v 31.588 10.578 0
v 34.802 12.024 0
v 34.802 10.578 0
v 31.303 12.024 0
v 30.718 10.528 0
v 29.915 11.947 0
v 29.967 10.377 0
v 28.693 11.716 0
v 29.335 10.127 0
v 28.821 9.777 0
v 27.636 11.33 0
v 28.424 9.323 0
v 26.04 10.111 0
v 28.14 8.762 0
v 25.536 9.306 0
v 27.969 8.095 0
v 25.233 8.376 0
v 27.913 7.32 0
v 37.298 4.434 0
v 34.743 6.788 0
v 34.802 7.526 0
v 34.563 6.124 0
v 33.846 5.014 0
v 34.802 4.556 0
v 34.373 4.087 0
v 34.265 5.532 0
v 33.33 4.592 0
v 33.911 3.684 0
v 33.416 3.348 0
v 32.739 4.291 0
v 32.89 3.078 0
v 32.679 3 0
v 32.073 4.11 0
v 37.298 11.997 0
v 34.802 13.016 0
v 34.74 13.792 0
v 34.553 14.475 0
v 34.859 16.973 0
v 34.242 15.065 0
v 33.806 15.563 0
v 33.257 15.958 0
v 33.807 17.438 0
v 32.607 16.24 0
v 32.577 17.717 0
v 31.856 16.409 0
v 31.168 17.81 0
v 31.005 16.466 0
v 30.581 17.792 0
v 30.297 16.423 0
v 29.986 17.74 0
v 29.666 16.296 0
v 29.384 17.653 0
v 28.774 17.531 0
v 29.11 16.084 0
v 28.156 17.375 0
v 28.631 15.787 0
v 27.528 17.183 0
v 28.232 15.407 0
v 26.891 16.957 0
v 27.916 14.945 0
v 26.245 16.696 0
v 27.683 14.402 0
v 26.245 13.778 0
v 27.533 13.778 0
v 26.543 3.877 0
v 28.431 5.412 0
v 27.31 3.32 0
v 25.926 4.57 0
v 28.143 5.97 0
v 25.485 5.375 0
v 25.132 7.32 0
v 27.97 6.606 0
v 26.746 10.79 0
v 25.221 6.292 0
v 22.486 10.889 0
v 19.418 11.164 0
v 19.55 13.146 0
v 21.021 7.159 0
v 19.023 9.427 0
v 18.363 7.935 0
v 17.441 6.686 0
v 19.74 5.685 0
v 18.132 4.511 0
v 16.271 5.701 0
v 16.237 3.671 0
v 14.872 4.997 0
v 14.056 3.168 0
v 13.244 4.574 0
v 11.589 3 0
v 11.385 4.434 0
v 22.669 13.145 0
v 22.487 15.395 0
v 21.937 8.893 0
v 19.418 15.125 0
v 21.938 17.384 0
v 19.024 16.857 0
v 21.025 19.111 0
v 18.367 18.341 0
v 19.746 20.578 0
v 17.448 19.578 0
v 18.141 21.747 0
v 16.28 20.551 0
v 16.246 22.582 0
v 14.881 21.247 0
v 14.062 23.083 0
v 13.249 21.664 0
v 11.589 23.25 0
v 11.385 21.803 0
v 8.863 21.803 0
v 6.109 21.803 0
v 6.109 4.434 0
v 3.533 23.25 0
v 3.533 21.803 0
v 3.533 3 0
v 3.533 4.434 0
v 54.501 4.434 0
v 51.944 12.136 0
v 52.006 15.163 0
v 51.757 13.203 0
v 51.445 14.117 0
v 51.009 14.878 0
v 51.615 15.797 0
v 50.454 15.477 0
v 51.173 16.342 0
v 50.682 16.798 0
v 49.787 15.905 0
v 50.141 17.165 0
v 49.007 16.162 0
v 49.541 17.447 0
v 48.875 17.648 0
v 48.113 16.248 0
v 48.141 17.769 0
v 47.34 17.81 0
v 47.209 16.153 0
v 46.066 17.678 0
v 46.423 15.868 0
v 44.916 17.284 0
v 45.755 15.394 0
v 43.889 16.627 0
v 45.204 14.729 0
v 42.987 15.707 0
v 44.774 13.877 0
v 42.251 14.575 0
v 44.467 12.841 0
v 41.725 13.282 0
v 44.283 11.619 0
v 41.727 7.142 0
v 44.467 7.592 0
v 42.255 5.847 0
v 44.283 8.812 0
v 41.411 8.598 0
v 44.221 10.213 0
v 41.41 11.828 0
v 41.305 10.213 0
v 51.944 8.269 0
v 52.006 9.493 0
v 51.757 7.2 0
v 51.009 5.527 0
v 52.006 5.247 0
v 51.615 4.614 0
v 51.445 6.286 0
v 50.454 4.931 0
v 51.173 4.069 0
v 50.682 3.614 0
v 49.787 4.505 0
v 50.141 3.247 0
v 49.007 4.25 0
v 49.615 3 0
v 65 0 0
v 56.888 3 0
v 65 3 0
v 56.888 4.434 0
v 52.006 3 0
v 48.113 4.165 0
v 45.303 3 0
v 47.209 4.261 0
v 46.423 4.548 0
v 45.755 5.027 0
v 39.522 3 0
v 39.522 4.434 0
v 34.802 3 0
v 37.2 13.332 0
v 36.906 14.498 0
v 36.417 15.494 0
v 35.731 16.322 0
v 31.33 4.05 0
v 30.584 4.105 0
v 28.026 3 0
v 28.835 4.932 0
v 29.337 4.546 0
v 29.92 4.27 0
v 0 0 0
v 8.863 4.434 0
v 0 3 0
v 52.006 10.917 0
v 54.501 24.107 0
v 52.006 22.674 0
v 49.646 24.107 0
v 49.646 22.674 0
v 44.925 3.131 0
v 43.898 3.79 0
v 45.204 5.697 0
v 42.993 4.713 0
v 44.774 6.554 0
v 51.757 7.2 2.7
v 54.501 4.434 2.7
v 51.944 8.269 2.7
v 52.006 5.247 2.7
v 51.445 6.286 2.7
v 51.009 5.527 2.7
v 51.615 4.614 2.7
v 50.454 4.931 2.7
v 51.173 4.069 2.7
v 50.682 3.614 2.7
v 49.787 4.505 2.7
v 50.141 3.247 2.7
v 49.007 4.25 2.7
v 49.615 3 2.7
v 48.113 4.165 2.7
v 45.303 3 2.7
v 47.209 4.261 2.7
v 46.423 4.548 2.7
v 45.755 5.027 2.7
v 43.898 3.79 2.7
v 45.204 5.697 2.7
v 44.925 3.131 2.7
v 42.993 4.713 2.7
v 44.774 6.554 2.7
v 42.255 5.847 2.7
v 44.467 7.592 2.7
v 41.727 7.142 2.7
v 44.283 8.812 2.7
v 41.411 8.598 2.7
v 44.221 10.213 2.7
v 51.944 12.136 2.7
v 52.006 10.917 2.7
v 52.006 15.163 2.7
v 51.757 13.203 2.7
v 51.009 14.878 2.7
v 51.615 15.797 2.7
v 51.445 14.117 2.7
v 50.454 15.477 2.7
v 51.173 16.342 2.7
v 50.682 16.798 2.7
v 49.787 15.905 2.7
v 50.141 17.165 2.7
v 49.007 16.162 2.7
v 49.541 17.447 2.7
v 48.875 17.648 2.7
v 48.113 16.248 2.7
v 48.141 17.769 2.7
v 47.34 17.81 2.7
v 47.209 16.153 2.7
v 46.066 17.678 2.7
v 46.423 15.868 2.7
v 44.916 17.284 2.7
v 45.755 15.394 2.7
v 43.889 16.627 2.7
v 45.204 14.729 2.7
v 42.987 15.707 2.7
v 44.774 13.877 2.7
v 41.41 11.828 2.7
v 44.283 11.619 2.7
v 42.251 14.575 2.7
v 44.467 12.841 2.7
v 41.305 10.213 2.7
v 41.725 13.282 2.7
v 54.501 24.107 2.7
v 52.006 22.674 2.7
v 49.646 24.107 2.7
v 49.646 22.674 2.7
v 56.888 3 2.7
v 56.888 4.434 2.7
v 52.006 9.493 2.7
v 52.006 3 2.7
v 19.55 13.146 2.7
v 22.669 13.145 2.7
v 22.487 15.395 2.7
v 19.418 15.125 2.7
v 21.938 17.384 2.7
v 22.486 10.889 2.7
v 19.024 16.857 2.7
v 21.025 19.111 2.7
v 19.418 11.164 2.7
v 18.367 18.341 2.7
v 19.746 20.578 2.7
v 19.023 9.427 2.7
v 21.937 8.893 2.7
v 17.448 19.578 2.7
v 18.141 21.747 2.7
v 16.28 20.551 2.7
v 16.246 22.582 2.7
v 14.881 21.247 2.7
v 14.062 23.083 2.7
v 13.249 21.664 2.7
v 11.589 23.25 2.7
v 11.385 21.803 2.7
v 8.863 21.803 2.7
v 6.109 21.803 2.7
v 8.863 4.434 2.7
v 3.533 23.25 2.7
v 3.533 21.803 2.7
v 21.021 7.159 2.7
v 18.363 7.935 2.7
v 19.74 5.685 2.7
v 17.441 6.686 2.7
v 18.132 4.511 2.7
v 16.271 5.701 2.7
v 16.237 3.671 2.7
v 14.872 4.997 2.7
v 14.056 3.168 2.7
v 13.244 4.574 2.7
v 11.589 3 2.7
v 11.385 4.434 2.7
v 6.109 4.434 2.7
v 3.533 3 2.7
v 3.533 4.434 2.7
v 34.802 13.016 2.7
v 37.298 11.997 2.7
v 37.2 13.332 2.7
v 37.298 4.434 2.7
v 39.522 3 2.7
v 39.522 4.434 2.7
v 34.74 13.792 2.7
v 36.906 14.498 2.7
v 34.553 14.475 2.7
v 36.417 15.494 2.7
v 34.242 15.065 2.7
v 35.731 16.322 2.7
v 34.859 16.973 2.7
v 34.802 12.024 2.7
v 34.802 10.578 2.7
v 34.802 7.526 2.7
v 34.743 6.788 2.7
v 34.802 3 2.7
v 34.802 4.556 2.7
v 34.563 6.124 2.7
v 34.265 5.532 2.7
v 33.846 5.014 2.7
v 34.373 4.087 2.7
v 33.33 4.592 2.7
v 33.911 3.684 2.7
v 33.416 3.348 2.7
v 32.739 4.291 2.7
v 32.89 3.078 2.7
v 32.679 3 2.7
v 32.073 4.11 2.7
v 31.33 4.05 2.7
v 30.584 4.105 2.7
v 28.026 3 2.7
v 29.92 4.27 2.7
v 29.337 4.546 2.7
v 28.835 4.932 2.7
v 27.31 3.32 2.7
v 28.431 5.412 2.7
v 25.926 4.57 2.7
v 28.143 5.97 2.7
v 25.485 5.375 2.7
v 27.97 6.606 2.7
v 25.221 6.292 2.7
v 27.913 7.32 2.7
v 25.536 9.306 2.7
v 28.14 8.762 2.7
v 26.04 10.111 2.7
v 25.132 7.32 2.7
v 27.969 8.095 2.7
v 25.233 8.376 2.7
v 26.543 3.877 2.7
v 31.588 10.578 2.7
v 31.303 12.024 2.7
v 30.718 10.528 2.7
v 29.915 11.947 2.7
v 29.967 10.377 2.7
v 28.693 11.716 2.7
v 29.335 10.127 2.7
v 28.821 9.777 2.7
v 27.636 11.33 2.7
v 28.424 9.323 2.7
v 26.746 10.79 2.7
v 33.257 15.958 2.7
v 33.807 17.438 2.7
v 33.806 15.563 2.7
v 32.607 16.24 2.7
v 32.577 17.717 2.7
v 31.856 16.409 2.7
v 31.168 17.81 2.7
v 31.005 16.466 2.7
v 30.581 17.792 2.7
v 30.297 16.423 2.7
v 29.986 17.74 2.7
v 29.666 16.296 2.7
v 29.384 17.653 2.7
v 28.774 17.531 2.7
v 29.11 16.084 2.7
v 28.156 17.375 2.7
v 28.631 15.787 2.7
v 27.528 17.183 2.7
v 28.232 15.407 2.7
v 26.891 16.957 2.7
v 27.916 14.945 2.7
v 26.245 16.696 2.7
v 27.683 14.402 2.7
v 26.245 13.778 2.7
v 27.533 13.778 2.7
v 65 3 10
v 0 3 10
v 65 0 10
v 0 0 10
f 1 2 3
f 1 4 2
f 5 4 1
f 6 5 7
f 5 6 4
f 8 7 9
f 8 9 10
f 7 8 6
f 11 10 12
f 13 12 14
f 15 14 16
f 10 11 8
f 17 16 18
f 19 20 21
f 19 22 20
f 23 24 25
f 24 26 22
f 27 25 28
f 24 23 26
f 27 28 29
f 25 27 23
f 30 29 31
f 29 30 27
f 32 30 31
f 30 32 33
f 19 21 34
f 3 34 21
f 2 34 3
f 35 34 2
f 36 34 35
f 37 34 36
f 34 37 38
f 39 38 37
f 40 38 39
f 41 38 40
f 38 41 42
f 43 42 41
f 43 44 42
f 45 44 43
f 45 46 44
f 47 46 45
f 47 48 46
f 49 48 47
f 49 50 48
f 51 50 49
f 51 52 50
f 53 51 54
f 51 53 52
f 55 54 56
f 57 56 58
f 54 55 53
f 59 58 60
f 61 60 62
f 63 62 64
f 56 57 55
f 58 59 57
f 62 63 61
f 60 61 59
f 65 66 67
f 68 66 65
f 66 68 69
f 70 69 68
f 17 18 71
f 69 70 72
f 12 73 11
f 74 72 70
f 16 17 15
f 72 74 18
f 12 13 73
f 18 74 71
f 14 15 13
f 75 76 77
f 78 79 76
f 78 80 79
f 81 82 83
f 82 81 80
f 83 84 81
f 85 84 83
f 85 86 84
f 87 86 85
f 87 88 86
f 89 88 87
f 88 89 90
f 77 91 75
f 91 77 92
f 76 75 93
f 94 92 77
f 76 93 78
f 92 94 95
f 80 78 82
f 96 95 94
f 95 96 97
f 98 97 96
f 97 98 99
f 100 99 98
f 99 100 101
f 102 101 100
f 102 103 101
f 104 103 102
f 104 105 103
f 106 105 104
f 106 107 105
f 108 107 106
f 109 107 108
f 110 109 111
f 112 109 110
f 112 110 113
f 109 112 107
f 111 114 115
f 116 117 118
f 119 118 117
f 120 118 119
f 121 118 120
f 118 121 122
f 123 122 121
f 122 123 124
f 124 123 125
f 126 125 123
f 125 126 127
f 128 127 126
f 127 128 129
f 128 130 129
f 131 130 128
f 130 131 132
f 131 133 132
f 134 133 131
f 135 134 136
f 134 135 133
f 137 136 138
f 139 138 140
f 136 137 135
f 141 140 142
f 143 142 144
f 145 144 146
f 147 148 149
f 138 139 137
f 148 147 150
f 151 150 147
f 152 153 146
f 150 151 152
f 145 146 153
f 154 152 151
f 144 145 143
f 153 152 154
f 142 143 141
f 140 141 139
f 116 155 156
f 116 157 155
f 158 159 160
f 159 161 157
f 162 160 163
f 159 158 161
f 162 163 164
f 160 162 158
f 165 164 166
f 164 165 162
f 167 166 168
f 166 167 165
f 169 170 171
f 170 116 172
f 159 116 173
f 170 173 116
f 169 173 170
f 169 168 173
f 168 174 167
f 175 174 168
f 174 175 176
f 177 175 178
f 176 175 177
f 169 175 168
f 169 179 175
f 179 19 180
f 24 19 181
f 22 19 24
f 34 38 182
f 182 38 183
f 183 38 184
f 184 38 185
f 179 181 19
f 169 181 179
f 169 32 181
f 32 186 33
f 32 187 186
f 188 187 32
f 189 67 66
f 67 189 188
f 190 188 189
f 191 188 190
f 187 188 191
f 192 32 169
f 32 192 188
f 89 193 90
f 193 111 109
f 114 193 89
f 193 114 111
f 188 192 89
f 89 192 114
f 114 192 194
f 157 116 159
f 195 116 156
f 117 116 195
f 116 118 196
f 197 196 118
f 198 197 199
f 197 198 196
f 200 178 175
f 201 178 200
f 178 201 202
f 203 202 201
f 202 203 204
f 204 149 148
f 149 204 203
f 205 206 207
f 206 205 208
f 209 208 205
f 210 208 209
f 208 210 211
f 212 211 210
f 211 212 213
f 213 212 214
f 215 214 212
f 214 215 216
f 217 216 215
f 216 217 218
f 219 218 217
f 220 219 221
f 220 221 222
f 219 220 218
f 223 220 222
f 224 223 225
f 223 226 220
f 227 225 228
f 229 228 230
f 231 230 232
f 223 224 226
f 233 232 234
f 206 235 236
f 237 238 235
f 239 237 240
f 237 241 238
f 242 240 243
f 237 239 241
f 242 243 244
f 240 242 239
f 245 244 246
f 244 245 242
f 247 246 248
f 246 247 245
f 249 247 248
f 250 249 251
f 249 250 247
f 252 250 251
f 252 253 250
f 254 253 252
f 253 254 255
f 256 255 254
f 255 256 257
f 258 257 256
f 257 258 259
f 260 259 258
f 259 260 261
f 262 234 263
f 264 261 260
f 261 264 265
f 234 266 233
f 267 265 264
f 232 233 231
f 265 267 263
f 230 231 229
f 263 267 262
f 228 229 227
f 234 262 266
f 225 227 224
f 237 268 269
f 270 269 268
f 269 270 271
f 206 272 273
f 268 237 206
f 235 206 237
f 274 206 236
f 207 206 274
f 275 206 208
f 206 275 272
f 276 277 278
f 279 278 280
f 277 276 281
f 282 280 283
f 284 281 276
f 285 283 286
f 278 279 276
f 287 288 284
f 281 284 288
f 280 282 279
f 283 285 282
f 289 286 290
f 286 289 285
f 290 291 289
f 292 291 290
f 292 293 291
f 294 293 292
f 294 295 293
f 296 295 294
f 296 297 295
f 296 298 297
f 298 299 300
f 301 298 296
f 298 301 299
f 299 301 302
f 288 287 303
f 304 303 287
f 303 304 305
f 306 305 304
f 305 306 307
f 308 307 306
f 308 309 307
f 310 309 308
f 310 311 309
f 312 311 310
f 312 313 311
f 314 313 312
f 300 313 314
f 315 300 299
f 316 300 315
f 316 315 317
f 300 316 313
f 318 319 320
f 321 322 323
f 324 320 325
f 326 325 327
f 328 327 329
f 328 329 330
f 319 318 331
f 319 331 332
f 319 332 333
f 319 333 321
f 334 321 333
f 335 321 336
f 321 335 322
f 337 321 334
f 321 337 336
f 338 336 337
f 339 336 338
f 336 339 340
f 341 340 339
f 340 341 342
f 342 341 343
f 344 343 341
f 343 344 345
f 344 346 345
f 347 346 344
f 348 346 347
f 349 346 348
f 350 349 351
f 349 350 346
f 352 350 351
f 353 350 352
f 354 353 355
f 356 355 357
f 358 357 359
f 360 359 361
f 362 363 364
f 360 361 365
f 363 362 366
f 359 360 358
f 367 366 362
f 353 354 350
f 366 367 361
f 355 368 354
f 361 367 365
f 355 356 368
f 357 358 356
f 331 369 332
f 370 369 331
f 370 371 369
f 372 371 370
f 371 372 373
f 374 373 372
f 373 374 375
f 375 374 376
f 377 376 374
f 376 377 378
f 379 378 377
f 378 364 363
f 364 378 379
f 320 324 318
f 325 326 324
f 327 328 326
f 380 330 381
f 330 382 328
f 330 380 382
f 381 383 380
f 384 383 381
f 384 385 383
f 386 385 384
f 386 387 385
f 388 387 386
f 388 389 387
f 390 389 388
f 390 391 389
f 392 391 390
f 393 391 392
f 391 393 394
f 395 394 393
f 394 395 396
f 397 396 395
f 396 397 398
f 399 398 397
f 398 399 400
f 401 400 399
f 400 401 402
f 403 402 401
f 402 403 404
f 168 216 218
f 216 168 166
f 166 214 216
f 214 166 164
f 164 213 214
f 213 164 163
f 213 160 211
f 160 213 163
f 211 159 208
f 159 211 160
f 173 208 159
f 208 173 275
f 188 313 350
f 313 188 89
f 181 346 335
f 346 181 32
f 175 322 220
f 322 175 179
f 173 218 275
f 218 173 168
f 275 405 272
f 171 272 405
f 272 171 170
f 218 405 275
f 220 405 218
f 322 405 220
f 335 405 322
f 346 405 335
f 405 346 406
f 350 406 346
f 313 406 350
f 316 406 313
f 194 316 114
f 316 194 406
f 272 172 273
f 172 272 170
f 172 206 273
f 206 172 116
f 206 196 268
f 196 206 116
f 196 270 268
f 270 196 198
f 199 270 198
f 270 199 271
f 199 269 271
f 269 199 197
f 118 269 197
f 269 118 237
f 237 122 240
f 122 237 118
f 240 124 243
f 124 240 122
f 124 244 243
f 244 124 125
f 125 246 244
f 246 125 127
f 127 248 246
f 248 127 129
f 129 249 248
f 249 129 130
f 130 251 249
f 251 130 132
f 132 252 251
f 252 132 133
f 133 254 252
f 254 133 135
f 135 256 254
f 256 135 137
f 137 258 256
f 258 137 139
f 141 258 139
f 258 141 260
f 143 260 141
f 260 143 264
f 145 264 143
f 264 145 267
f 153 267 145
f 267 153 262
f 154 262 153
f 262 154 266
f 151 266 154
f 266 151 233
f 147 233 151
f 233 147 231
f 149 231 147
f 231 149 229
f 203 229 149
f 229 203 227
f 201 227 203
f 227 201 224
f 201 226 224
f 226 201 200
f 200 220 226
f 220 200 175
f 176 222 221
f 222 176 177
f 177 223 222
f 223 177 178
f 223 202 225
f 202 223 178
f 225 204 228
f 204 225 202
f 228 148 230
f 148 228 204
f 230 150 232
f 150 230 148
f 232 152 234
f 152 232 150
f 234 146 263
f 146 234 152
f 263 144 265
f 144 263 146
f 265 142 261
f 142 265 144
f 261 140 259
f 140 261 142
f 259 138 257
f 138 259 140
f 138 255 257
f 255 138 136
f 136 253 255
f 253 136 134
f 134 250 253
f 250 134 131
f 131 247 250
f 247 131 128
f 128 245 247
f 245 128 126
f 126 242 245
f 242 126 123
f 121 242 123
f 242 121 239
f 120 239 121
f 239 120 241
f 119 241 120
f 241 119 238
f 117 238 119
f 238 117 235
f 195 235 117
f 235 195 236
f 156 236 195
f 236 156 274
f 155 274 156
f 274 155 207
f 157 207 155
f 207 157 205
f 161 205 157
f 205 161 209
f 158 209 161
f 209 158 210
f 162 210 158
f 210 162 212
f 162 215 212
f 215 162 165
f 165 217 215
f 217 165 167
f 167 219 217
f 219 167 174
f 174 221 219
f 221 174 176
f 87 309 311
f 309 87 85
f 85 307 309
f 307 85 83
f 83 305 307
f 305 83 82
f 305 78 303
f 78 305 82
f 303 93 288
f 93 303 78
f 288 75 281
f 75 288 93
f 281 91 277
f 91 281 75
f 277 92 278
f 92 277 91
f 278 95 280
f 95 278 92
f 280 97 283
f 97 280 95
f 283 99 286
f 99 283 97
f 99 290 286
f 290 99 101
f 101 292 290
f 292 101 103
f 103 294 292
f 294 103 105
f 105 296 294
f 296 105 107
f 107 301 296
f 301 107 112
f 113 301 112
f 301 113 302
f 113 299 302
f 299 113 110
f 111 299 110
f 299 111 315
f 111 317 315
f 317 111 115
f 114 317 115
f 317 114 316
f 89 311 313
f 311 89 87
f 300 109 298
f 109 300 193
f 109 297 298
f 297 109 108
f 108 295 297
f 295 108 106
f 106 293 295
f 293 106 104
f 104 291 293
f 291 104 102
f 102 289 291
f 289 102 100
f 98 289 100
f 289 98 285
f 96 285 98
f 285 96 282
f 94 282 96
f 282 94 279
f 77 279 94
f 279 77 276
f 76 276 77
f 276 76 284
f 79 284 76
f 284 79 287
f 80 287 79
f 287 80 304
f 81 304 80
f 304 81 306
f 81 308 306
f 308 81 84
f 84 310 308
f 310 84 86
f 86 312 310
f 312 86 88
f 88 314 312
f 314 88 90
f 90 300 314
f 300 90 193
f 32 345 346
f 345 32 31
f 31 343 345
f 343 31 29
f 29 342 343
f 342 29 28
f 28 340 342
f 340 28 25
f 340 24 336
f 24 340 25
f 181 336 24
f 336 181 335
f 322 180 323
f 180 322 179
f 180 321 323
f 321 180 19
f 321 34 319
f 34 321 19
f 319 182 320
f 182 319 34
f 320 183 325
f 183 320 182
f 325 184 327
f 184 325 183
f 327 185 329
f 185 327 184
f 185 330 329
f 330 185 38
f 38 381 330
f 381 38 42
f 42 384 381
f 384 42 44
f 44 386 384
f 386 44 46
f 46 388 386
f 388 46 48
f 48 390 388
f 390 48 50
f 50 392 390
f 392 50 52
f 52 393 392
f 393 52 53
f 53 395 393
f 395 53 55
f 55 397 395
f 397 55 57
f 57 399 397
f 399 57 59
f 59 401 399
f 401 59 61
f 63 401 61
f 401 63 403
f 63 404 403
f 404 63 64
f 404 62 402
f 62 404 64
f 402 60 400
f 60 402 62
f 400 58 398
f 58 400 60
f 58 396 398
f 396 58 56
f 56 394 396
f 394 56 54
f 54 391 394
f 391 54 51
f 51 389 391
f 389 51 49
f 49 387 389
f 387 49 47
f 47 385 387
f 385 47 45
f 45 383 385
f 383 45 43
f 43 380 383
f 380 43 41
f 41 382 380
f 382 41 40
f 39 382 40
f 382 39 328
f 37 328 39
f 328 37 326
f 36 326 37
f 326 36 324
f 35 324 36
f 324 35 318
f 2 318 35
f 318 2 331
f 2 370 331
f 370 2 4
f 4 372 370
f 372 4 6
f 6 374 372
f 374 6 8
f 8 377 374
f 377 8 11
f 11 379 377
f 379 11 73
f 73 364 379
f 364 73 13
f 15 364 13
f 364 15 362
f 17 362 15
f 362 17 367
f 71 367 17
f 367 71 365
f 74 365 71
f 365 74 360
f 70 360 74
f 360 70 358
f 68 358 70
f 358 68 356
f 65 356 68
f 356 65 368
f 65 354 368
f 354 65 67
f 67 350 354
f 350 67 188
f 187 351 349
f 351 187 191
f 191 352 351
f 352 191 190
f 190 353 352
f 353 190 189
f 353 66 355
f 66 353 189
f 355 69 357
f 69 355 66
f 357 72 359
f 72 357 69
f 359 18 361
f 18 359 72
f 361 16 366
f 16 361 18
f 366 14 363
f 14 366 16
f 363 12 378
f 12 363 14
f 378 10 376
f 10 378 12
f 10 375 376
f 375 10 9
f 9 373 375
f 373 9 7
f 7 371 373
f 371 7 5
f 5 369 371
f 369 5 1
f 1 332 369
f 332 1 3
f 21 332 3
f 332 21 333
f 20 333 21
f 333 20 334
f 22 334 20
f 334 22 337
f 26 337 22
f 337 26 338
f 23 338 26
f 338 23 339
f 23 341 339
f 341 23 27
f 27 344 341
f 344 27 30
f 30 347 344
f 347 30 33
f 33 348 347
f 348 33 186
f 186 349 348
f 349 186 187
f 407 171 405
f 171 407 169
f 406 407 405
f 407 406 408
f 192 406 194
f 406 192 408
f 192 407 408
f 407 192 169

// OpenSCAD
translate([2, 3, 0])
linear_extrude(height=2.7)
    text("Dad", 20, "Georgia");

cube([65, 3, 10]);
